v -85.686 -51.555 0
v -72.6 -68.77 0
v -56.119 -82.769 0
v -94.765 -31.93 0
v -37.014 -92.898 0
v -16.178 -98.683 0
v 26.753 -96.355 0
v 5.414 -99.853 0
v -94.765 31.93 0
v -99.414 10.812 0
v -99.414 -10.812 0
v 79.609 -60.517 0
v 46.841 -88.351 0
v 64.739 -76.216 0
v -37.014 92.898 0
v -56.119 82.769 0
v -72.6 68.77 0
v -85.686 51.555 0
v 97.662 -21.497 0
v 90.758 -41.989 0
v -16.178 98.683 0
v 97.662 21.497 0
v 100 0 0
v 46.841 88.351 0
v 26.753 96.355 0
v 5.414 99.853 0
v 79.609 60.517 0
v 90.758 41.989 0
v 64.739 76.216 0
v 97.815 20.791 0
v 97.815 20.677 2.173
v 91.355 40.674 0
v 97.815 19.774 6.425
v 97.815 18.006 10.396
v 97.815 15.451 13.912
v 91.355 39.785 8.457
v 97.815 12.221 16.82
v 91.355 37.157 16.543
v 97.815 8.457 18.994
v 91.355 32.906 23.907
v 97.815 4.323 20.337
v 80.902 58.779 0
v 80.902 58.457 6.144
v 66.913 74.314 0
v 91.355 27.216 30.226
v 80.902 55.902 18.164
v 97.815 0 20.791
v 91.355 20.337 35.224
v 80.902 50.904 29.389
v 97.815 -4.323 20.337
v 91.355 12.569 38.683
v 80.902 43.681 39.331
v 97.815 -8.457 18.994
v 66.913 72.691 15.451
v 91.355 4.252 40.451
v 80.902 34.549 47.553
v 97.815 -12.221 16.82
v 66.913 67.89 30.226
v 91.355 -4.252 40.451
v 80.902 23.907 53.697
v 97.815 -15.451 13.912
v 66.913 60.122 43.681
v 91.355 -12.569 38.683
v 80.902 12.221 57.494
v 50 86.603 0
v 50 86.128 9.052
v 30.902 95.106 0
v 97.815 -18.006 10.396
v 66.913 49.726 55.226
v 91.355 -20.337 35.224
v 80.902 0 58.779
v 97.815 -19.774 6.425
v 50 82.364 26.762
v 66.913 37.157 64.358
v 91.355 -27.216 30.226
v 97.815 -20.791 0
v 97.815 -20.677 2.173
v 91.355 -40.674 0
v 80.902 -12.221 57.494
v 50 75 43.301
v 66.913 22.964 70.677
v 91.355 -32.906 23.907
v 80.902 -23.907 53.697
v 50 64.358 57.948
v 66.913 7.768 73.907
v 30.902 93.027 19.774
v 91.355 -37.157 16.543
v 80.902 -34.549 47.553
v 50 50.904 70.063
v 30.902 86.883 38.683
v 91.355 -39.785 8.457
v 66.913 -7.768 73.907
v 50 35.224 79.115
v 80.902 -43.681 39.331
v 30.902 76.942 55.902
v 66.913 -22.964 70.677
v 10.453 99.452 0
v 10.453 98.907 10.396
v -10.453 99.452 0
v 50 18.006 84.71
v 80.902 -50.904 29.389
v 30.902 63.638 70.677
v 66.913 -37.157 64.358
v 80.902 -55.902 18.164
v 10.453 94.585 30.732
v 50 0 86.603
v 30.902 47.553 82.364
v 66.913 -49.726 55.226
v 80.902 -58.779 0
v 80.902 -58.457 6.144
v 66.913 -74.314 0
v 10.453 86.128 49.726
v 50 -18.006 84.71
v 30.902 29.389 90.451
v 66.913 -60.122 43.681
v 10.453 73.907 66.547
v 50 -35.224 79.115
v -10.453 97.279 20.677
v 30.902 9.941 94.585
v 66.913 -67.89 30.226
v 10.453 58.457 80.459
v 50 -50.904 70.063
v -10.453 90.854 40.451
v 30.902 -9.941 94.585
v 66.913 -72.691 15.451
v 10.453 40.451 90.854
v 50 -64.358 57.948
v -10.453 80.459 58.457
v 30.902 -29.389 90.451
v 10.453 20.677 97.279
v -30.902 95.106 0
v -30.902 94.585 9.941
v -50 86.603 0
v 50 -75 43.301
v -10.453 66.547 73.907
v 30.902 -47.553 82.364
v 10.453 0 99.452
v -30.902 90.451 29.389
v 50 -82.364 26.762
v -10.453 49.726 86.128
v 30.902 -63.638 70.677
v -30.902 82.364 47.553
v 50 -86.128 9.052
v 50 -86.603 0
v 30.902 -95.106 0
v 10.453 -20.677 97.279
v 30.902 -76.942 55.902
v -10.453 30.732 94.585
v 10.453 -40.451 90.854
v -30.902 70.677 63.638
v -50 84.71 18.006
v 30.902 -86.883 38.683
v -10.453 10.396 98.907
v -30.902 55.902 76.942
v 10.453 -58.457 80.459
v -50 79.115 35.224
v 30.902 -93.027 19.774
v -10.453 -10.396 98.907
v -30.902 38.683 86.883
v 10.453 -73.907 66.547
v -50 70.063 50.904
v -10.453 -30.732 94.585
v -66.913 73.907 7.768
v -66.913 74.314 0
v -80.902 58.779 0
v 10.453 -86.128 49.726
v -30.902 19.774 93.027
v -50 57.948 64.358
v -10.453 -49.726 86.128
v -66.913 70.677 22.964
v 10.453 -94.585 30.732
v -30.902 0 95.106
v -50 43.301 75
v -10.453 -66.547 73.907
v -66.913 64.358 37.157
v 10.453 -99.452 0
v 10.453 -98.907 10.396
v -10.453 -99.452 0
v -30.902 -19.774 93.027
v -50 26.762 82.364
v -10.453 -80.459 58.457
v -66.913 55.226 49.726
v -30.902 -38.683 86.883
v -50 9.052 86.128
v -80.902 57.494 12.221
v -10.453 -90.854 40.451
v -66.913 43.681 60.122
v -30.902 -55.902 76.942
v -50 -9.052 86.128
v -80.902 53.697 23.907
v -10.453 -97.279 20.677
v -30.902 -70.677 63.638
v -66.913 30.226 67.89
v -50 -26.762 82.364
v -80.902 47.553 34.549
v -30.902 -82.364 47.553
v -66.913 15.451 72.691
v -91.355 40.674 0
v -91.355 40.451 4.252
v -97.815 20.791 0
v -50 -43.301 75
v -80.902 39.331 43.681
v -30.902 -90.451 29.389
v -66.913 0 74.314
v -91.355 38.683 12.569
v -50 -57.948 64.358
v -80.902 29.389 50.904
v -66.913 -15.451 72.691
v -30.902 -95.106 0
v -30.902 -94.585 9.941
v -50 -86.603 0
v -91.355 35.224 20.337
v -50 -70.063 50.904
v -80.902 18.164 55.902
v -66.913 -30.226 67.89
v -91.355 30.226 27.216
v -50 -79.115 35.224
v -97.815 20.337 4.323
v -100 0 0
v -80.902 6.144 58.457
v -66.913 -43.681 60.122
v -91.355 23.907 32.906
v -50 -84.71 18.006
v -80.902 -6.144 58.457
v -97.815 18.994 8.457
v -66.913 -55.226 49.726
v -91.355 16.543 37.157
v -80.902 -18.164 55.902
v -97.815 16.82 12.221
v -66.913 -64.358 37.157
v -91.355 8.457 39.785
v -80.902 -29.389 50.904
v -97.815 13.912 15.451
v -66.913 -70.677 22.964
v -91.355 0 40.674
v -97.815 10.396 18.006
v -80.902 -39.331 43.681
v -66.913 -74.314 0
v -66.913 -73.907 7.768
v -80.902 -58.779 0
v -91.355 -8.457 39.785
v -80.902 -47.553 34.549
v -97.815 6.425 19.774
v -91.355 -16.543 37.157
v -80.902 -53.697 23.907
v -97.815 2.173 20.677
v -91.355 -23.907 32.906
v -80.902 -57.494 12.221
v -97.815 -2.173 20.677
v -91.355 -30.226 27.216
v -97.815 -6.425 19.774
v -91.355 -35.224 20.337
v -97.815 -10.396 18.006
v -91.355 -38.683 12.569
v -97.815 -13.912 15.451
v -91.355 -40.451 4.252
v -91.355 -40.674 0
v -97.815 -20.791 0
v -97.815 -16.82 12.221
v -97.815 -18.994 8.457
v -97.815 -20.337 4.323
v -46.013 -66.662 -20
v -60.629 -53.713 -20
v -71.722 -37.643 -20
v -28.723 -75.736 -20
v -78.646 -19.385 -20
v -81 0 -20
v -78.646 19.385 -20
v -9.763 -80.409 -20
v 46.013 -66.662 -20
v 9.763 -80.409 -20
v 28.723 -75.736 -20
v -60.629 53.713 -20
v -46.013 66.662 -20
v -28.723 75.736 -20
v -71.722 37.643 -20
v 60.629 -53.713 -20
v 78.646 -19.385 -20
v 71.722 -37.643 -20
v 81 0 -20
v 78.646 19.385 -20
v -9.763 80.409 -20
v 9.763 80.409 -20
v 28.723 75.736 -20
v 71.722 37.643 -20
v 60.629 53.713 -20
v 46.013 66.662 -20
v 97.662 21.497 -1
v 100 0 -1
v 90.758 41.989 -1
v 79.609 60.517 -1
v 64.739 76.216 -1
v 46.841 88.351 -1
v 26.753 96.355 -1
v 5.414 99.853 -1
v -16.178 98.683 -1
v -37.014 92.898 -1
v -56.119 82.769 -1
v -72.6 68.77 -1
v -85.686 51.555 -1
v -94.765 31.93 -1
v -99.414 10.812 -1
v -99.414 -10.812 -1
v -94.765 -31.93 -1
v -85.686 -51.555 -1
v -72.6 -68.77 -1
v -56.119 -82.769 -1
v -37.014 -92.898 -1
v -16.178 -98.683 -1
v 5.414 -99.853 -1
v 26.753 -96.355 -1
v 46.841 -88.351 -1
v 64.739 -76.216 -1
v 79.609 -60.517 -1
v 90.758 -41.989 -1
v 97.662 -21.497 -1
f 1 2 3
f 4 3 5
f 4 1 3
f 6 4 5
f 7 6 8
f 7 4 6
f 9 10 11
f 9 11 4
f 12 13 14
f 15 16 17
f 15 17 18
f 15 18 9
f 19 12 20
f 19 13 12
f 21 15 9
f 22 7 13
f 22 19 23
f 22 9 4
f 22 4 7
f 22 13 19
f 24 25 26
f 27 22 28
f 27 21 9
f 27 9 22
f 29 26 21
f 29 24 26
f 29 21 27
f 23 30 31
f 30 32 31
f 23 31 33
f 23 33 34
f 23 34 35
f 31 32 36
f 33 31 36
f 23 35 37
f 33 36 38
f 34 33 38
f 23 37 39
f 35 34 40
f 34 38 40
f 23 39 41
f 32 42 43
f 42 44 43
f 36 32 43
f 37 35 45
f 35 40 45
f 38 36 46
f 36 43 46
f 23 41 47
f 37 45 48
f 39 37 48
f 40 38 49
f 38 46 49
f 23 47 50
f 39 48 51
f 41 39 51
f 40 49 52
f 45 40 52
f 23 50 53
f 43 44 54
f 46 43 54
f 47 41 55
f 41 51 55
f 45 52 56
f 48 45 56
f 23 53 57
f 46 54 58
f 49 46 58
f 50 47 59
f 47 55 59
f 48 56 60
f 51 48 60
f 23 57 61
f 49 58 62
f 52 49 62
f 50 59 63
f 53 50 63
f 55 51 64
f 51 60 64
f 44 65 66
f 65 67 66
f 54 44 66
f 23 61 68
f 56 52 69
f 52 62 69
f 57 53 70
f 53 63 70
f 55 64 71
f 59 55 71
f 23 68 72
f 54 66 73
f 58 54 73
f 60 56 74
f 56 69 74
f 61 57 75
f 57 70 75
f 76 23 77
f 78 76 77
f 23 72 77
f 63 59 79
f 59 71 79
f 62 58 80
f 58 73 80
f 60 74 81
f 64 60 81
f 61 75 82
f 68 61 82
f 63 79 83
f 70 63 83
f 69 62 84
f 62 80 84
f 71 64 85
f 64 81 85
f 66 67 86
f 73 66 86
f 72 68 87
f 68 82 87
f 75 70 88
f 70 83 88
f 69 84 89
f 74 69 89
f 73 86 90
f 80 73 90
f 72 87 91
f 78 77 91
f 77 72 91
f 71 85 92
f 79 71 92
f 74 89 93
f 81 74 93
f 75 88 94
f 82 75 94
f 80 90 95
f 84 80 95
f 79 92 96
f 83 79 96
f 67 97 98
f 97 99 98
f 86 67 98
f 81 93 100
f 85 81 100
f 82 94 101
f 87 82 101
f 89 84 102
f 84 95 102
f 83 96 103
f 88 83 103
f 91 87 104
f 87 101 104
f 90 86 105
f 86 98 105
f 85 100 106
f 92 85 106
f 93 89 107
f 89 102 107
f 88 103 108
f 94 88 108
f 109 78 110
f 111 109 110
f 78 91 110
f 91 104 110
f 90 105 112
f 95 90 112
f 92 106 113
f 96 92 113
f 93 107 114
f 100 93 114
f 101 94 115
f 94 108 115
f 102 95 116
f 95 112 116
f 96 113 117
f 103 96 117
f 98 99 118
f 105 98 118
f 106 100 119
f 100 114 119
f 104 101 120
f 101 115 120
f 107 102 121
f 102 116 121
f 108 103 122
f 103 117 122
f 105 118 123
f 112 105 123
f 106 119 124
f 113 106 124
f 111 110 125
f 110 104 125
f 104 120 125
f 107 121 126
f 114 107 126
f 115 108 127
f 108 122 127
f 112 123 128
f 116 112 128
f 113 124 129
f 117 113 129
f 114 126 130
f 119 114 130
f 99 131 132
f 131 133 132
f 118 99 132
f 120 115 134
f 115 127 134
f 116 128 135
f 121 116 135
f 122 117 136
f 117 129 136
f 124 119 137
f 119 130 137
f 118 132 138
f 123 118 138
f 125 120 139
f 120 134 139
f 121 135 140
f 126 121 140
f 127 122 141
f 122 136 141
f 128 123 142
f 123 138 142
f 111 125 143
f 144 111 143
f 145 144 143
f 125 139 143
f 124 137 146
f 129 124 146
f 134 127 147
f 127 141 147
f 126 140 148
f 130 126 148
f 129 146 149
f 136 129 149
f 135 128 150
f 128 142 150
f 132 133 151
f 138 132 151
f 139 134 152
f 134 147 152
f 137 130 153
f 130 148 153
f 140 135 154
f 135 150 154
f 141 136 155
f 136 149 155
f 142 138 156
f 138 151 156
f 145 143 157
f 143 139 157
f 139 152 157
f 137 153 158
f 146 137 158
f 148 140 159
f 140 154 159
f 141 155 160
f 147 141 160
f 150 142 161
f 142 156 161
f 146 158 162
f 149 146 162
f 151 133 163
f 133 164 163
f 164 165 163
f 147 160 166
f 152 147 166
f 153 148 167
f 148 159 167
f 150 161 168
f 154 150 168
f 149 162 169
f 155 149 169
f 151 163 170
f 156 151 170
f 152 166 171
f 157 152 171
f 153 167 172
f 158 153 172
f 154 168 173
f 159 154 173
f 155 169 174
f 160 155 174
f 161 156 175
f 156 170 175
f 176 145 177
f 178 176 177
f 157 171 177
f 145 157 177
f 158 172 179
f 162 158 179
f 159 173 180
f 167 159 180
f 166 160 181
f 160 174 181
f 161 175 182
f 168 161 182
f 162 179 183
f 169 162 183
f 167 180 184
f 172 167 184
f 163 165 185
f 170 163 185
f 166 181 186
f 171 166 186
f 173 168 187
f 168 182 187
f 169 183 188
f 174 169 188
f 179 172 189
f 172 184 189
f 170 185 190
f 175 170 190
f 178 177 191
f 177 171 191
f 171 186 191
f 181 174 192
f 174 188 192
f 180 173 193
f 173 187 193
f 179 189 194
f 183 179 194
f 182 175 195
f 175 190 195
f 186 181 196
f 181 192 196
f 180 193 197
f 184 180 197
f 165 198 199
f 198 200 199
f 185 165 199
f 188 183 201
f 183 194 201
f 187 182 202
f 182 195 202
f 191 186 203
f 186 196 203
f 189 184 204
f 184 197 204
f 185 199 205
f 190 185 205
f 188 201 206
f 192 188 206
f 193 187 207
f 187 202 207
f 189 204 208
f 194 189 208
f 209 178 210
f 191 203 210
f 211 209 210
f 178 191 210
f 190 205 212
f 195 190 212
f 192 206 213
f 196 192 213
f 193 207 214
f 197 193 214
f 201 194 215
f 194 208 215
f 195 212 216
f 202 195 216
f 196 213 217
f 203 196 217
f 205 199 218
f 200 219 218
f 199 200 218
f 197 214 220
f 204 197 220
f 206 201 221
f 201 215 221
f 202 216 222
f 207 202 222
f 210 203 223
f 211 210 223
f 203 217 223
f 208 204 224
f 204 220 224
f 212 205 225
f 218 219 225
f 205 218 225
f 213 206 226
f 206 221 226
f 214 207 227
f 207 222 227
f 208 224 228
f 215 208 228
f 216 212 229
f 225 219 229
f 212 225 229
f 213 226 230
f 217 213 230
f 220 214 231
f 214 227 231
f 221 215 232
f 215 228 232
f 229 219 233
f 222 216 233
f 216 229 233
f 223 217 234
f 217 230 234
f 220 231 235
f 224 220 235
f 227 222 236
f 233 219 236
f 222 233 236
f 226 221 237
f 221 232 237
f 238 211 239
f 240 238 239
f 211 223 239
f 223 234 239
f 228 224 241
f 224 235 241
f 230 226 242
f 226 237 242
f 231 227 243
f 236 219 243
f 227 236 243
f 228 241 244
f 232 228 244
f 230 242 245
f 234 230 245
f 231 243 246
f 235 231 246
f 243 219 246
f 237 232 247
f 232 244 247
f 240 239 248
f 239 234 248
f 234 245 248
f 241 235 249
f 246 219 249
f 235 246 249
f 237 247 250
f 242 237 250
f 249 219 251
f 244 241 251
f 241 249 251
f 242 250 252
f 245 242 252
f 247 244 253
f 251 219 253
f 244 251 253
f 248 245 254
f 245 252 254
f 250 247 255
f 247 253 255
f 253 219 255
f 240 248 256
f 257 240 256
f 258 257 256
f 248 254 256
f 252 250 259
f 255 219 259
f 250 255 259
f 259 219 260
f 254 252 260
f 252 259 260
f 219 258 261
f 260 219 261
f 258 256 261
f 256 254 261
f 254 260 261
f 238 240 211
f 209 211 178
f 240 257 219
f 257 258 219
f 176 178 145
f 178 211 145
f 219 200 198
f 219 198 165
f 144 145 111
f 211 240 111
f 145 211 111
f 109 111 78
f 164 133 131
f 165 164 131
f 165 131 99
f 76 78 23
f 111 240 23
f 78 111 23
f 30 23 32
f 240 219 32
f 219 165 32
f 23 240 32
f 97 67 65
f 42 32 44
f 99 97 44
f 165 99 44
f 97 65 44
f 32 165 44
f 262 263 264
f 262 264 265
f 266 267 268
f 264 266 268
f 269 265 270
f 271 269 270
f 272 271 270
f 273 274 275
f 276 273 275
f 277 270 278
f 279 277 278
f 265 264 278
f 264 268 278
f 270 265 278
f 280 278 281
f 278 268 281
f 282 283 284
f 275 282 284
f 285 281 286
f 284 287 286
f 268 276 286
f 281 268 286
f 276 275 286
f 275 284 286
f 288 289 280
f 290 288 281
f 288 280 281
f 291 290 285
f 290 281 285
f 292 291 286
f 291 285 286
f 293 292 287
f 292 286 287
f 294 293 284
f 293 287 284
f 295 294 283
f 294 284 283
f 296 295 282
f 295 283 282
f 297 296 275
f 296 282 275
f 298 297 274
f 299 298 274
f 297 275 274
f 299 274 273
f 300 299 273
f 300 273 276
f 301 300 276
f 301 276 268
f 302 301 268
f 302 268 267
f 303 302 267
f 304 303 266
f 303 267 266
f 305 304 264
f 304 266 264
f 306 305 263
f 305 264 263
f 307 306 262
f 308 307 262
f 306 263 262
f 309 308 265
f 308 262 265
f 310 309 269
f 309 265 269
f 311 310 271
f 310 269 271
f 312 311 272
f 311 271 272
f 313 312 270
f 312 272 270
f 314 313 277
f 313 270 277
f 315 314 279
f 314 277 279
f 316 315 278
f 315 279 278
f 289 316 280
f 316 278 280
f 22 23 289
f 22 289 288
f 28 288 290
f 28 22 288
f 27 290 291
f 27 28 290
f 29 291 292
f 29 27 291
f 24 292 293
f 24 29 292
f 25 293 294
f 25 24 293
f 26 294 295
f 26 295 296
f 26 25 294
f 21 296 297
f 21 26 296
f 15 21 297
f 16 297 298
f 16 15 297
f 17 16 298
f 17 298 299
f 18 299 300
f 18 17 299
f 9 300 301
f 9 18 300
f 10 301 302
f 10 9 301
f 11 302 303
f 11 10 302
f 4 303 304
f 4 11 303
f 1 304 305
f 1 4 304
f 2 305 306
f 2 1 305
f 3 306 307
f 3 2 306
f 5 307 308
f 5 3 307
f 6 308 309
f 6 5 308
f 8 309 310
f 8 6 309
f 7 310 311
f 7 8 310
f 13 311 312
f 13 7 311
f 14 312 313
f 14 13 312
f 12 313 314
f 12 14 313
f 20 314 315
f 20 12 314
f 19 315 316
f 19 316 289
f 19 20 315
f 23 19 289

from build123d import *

# Parameters (mm, degrees)
REVOLUTION_ANGLE = 180
SKETCH001_R      = 100
PAD_DEPTH        = 20
CHAMFER_SIZE     = 19


with BuildPart() as revolution:
    # Sketch → Revolution (revolve)
    with BuildSketch(Plane.XY):
        with BuildLine():
            ThreePointArc((100, 0), (0, 100), (-100, 0))
            Line((-100, 0), (100, 0))
        make_face()
    revolve(axis=Axis((0, 0, 0), (1, 0, 0)), revolution_arc=REVOLUTION_ANGLE)


with BuildPart() as chamfer_body:
    # Sketch001 → Pad (new body)
    with BuildSketch(Plane.XY):
        Circle(SKETCH001_R)
    extrude(amount=-PAD_DEPTH)

    # Chamfer
    chamfer_edges = [chamfer_body.edges().sort_by_distance(p)[0] for p in [
        (-100, 0, -20),
    ]]
    chamfer(chamfer_edges, length=CHAMFER_SIZE)


solid = Compound([revolution.part, chamfer_body.part])
